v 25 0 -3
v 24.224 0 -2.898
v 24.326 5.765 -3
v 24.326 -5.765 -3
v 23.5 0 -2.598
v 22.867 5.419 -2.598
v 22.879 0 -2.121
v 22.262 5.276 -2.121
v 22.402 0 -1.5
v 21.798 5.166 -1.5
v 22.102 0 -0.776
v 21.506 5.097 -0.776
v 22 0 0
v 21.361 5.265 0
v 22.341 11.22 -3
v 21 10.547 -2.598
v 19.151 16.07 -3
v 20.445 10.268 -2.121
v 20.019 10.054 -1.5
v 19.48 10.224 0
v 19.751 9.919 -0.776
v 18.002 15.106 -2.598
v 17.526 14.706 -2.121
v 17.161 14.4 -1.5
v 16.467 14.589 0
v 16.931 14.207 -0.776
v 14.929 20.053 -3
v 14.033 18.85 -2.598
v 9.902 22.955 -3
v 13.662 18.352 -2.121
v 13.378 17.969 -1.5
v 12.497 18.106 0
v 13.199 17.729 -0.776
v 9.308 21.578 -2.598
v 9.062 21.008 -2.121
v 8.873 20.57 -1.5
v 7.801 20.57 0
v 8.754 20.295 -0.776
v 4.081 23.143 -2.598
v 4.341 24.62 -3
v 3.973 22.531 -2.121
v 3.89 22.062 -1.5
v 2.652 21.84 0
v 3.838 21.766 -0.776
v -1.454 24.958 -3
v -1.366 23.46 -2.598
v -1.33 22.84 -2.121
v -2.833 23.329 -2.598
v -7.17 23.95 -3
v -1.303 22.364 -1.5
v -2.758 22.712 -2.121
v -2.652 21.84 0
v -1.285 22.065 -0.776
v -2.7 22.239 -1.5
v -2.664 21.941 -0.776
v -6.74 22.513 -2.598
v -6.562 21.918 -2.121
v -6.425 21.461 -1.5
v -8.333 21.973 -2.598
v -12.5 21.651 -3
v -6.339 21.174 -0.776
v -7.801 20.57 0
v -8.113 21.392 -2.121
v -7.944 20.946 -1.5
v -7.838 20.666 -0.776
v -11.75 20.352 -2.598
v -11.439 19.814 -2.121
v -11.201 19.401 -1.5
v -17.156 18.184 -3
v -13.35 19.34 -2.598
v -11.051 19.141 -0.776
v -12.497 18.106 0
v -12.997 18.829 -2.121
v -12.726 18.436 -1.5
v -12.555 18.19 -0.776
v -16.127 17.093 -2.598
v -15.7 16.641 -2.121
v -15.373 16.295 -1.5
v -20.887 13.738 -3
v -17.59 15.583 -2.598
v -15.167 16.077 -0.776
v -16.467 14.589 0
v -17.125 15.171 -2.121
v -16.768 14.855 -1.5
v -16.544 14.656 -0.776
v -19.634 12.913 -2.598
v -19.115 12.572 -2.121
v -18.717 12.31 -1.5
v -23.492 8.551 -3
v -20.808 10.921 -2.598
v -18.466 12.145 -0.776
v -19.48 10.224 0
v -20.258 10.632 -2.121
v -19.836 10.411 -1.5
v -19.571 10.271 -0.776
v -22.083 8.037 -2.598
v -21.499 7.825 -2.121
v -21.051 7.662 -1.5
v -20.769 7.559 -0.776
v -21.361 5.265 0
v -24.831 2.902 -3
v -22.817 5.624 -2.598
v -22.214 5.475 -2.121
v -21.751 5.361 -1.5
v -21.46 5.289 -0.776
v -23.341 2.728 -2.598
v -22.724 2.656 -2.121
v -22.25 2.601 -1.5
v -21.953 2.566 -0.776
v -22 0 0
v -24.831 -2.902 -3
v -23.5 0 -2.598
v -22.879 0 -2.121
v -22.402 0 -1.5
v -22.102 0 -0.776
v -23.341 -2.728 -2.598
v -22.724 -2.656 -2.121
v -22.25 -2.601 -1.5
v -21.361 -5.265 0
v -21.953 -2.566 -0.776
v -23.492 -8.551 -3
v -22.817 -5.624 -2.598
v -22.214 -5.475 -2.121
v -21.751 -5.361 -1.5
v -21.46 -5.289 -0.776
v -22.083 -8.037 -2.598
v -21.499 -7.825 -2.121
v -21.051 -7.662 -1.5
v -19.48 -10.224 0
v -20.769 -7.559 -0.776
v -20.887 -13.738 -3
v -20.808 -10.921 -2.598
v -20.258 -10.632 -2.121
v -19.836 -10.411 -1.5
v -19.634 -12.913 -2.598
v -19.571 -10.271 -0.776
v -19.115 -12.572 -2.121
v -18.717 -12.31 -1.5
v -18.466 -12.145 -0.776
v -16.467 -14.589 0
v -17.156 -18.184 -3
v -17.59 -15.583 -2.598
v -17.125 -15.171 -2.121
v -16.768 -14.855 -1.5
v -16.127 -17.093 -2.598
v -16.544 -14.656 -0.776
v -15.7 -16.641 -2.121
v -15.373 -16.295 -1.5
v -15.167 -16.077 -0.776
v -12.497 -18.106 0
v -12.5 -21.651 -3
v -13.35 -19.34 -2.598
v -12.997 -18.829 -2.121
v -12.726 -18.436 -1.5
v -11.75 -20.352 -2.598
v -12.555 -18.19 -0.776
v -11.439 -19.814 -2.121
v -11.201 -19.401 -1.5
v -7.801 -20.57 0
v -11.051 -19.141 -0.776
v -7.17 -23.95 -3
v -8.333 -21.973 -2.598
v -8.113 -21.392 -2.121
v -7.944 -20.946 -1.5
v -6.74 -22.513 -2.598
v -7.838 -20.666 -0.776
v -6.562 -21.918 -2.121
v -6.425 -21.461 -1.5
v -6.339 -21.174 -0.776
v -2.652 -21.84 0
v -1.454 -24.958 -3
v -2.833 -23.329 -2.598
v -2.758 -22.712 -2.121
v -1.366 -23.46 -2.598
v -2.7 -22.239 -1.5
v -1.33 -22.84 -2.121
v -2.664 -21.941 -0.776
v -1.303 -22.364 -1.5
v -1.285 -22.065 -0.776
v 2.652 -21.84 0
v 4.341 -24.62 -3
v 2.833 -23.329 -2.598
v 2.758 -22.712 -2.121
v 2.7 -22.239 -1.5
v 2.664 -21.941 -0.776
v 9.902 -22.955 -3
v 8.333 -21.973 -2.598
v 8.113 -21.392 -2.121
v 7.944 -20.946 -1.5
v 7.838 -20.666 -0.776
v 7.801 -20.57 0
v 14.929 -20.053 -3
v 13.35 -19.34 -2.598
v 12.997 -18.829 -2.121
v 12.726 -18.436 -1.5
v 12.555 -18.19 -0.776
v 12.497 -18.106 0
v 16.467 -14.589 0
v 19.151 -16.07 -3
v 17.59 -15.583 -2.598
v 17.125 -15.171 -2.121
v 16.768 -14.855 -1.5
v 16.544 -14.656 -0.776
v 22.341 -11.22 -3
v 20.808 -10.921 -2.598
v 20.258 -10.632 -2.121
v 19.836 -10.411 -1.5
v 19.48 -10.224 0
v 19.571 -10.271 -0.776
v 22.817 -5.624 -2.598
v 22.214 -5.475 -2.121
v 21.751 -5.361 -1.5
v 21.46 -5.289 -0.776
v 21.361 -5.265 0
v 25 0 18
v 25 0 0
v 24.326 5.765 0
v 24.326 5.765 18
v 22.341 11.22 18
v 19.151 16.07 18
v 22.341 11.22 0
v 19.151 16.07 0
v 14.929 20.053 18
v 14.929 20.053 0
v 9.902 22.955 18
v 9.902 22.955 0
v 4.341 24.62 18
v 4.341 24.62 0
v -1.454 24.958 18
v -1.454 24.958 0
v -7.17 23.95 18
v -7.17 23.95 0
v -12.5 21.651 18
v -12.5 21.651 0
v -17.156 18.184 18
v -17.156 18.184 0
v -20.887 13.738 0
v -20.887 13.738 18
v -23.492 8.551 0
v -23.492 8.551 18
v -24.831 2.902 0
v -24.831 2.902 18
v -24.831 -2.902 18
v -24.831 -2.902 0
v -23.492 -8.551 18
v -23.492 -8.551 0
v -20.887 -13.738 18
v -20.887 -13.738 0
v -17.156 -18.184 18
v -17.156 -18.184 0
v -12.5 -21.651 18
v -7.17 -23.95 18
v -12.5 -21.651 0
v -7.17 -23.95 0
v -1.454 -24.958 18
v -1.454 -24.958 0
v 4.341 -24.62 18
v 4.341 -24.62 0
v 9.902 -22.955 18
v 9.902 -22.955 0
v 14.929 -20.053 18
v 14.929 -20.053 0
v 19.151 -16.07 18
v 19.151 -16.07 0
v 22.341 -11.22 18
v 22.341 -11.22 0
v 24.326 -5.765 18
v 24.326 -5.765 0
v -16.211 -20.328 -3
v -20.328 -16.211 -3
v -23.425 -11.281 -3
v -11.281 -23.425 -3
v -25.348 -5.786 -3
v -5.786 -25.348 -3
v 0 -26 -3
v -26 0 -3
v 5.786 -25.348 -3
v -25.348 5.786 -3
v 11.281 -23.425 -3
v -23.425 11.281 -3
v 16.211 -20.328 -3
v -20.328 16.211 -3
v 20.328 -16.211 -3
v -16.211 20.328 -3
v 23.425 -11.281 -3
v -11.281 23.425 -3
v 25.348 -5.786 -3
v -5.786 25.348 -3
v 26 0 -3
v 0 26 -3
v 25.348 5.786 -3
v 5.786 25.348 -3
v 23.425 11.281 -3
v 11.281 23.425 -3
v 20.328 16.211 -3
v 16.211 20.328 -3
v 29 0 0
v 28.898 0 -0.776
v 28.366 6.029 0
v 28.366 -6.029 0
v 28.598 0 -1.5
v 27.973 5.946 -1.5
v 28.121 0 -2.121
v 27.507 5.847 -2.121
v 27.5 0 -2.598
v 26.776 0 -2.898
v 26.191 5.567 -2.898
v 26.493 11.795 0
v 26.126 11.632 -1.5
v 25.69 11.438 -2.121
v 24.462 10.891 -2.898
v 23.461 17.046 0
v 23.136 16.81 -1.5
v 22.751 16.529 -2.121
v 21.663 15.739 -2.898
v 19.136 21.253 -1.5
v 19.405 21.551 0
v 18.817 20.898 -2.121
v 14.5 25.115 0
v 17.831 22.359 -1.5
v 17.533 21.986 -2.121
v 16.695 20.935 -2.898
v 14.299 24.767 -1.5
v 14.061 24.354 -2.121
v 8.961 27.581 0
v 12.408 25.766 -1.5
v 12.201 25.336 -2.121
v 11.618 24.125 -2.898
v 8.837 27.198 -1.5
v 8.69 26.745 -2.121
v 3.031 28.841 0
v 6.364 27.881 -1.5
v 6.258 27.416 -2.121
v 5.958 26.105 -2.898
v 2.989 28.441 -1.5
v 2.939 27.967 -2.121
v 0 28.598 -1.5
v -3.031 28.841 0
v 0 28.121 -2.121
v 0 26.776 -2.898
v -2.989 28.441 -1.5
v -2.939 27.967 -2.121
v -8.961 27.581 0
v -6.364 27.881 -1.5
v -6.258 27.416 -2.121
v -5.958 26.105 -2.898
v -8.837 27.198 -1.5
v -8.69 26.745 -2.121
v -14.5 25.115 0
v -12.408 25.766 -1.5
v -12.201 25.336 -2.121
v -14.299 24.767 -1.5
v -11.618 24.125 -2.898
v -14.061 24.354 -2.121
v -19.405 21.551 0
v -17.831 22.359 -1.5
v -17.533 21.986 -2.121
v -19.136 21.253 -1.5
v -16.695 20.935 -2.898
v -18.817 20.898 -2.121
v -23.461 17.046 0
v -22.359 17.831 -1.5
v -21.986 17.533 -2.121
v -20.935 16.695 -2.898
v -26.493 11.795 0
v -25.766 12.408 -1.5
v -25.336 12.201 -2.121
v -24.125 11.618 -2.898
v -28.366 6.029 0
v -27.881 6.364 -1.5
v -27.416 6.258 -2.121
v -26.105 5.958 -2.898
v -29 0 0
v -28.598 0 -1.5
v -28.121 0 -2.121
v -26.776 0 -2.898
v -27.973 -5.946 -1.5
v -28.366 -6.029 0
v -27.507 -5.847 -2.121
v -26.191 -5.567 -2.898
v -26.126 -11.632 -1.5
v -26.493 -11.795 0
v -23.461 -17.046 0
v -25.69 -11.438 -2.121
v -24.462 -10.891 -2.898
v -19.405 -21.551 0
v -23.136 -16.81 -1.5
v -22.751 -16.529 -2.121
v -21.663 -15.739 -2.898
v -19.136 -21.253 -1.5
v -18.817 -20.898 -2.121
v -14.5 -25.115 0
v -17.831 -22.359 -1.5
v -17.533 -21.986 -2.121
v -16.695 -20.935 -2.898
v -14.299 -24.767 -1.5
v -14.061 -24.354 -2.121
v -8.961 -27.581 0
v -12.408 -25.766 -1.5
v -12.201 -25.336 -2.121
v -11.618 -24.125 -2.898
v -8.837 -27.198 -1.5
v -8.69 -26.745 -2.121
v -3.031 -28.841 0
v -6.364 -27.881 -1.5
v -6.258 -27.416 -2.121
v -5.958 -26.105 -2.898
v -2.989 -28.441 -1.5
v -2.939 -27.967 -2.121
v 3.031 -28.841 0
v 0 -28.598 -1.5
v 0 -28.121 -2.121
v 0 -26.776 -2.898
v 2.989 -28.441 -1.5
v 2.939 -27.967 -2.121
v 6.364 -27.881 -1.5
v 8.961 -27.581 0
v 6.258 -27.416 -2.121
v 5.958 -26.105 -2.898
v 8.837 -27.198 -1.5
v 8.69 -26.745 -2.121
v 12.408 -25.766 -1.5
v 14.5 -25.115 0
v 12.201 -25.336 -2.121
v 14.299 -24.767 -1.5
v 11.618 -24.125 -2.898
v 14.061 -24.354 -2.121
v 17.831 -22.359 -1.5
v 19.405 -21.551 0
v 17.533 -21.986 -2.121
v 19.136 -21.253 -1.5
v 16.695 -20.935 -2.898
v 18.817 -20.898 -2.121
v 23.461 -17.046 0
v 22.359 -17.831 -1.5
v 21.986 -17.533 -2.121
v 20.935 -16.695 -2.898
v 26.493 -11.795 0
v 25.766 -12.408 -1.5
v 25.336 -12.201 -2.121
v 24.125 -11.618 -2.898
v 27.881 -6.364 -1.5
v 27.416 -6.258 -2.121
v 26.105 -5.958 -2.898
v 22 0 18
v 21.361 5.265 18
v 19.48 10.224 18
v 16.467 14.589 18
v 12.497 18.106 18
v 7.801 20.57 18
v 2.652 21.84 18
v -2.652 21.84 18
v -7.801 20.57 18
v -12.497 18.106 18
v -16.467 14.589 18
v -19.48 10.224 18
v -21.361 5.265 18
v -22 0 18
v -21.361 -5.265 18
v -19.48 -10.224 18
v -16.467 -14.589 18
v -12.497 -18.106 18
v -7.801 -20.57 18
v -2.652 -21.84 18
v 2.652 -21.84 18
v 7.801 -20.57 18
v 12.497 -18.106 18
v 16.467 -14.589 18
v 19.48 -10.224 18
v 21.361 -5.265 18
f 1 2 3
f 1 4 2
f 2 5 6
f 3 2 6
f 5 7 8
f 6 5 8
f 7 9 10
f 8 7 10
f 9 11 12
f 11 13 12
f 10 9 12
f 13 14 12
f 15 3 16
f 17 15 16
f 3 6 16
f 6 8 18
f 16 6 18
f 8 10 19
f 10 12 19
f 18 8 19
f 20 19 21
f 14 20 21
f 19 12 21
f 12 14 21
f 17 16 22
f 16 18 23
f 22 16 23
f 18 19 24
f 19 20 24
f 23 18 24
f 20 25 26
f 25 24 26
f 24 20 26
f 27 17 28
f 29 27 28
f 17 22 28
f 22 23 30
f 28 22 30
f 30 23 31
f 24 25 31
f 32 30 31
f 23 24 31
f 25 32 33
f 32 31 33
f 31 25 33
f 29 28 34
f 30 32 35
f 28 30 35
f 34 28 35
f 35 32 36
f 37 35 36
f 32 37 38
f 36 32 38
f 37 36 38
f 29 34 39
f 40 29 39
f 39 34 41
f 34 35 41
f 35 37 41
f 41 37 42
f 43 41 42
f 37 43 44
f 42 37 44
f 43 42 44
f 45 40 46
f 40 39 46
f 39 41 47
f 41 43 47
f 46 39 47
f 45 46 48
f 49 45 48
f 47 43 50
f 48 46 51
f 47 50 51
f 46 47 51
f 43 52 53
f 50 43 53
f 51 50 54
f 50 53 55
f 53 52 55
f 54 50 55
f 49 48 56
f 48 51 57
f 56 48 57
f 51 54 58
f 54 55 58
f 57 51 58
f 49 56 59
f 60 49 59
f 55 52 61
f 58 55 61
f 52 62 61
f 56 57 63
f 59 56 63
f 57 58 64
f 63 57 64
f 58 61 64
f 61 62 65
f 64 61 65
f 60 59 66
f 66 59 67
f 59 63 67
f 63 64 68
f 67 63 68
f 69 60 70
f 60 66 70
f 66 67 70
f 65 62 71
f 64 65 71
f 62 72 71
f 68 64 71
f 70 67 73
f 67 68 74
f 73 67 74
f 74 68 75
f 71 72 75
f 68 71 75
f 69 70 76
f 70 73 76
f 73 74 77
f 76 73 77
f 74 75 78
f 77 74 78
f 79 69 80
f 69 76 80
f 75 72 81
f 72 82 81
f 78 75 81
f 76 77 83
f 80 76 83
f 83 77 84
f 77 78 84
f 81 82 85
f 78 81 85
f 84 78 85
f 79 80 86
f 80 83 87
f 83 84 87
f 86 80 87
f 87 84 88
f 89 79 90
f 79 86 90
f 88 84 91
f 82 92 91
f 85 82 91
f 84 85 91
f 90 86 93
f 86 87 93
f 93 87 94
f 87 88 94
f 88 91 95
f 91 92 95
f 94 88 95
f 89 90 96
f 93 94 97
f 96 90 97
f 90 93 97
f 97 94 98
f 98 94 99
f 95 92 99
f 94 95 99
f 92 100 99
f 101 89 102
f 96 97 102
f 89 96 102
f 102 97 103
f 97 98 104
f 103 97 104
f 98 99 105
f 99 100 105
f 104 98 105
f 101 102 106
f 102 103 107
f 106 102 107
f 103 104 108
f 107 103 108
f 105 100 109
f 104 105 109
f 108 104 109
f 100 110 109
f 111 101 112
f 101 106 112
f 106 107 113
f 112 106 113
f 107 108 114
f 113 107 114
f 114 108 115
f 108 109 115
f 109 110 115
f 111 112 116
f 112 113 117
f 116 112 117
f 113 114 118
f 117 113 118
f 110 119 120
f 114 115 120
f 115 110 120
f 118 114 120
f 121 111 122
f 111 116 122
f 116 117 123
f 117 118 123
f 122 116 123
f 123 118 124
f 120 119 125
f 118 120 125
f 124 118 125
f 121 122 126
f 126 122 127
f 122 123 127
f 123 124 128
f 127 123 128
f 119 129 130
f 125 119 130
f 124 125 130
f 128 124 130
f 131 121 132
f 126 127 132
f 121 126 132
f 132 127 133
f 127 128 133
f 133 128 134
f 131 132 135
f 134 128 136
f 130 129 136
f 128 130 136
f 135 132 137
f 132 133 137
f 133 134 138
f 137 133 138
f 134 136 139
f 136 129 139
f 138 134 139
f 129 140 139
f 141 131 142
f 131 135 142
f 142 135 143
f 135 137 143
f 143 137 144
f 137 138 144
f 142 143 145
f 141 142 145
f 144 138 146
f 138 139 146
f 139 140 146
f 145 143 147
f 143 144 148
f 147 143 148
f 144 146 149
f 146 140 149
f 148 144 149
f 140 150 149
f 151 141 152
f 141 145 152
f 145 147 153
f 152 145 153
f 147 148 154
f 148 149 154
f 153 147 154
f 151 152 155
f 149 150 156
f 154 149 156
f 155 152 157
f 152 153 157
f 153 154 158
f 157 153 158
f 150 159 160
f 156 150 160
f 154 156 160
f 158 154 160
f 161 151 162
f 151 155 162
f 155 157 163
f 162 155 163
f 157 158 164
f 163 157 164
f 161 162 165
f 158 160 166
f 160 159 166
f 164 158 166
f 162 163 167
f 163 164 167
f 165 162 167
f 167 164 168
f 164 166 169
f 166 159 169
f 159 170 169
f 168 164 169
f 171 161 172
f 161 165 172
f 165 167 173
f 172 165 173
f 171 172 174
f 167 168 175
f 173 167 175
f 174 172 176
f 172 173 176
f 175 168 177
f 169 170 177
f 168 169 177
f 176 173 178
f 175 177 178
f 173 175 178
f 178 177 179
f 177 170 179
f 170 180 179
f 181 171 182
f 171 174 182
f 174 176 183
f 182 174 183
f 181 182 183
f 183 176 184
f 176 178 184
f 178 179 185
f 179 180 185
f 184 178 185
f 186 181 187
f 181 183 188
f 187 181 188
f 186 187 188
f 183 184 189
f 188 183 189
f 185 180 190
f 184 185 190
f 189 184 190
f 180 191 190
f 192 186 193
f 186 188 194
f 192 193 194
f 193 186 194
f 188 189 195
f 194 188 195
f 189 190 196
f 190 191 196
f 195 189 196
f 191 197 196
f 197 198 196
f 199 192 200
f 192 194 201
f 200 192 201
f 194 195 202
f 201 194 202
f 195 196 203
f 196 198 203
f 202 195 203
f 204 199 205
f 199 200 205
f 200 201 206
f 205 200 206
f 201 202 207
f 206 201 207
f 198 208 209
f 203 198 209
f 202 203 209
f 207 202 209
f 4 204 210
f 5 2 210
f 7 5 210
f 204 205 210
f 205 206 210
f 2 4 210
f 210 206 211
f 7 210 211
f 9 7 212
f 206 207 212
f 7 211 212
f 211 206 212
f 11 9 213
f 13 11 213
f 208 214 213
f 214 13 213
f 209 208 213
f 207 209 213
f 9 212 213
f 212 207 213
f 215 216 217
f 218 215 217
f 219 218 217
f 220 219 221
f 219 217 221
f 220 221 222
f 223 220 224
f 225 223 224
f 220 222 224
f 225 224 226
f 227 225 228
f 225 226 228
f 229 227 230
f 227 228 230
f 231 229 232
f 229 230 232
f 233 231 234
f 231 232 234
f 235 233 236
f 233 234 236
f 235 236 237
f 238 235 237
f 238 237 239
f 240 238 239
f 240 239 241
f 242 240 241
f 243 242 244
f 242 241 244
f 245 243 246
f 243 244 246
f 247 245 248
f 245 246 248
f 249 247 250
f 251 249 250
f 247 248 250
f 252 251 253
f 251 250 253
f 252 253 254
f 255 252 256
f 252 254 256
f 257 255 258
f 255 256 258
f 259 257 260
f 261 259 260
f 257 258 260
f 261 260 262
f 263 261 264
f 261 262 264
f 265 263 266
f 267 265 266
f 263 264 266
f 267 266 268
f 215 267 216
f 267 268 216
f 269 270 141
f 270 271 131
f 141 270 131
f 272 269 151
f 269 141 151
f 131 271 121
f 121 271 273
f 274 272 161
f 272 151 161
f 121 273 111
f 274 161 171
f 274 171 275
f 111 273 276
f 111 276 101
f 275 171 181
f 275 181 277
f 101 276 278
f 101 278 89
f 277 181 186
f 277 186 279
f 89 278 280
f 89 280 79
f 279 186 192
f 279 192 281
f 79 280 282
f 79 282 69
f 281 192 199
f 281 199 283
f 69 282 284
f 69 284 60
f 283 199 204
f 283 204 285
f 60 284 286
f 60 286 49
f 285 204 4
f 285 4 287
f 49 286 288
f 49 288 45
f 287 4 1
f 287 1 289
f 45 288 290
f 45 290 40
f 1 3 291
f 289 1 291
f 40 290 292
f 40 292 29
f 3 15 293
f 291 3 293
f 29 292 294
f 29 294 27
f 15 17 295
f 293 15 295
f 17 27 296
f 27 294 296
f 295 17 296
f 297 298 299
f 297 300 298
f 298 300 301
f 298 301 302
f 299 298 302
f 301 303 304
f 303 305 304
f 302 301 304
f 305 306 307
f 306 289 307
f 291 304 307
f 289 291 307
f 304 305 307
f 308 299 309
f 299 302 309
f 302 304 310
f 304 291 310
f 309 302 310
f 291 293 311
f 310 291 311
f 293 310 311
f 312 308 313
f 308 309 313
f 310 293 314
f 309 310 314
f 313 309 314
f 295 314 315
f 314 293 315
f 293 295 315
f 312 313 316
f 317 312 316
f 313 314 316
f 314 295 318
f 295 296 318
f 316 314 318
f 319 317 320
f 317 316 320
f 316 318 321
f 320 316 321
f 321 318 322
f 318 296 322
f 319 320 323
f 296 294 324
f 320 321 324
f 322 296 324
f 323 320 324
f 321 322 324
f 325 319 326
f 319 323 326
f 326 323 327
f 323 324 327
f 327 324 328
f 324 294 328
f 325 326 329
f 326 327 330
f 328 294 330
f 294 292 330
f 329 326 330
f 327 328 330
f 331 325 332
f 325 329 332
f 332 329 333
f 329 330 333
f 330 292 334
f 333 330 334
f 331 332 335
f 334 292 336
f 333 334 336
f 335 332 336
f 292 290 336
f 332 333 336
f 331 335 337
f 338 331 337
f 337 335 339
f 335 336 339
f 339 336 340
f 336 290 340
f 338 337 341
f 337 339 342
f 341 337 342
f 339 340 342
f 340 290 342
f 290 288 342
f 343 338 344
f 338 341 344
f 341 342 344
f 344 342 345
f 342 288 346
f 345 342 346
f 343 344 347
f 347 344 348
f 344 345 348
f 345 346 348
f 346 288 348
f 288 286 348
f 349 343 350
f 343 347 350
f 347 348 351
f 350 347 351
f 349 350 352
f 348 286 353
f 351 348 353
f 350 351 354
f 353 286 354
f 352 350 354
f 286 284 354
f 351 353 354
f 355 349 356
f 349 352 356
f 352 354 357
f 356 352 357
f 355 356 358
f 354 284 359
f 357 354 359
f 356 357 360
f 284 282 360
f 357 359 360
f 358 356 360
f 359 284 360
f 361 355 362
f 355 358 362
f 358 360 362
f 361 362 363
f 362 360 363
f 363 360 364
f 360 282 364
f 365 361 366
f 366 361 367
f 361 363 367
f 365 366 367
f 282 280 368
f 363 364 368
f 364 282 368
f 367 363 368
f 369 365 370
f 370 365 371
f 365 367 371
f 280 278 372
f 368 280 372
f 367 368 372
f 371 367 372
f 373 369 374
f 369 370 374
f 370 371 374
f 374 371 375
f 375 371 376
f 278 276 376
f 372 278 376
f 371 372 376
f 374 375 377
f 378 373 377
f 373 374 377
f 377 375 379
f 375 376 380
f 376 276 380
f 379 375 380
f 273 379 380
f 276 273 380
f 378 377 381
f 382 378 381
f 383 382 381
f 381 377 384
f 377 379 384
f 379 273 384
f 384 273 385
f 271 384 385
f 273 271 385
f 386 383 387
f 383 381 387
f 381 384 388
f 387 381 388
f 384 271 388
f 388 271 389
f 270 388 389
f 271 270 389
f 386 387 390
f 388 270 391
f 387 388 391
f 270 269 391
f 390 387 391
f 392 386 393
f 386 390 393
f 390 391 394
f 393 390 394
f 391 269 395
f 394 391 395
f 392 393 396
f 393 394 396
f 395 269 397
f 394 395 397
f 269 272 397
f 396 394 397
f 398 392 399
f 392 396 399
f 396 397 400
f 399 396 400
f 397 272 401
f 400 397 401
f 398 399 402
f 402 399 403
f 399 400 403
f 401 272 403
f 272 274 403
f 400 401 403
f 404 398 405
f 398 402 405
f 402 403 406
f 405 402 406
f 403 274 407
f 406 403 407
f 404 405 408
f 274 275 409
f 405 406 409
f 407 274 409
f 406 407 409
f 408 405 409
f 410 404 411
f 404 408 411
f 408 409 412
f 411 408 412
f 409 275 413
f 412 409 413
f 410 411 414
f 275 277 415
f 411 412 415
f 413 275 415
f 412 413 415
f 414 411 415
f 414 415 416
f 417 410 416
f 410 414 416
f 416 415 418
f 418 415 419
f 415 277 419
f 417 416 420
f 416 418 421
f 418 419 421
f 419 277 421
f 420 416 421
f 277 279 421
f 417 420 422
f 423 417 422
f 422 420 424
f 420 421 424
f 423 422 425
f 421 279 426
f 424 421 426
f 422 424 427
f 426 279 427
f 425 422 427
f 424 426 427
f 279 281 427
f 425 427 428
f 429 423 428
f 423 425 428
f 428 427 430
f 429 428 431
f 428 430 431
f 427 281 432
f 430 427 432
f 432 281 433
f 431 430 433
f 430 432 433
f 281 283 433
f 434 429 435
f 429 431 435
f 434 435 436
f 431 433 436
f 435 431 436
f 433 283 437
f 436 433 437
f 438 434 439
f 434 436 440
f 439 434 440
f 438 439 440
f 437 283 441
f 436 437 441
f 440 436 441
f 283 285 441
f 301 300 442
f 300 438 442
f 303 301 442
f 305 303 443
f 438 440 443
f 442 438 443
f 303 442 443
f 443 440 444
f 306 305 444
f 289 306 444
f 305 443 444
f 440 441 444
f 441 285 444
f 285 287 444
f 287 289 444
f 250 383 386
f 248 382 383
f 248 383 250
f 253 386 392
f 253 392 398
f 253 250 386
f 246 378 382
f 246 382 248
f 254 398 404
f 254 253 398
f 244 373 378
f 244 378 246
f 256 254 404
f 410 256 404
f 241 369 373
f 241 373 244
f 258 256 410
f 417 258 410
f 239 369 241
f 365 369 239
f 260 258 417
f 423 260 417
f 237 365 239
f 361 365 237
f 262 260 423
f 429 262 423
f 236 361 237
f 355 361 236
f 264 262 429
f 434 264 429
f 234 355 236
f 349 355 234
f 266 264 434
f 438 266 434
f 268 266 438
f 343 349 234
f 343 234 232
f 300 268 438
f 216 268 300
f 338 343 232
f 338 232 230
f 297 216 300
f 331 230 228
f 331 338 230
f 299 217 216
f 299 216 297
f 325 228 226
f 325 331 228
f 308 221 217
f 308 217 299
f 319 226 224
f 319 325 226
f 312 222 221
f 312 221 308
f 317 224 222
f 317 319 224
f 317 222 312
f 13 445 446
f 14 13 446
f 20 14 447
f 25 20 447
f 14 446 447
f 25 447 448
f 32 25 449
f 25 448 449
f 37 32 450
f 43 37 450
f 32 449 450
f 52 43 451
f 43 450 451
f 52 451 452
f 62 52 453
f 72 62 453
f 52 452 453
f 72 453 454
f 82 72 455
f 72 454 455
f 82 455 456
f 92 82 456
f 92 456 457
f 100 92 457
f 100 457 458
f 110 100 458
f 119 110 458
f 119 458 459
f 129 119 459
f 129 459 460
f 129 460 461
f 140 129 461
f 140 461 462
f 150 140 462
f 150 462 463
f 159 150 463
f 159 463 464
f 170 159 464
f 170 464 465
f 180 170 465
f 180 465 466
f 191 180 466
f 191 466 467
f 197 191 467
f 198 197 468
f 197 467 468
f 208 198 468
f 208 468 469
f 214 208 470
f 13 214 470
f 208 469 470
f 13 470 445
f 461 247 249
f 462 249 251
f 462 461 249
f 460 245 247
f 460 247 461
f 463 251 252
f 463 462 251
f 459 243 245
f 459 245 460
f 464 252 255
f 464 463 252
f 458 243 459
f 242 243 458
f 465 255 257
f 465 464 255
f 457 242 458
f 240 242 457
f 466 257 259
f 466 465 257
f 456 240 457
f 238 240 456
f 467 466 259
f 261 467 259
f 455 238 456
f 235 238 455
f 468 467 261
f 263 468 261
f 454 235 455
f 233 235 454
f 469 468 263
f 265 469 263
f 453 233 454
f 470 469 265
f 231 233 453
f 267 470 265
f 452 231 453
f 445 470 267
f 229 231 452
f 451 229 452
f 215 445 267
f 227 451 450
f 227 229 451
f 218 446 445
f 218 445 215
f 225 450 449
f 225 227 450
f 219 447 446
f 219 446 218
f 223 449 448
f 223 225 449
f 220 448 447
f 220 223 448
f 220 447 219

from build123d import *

# Parameters (mm, degrees)
F0_R     = 25
F1_DEPTH = 18
F2_R     = 29
F3_DEPTH = 3
F4_R     = 22
F5_DEPTH = 21.001
F6_R     = 2.99999


# Not quite as in the source:
# - a fillet or chamfer is up to 0.001 mm smaller than in the source, because OpenCascade refuses the exact size


with BuildPart() as f1:
    # F0 (on Top) → F1 (new body)
    with BuildSketch(Plane.XY):
        Circle(F0_R)
    extrude(amount=F1_DEPTH)

    # F2 (on Top) → F3 (join)
    with BuildSketch(Plane.XY):
        Circle(F2_R)
    extrude(amount=-F3_DEPTH)

    # F4 (on face) → F5 (cut, through all)
    with BuildSketch(Plane.XY.offset(18)):
        Circle(F4_R)
    extrude(amount=-F5_DEPTH, mode=Mode.SUBTRACT)

    # F6 (radius 3 in the source; OpenCascade refuses exactly that, so slightly less here)
    f6_edges = [f1.edges().sort_by_distance(p)[0] for p in [
        (-22, 0, -3),
        (-29, 0, -3),
    ]]
    fillet(f6_edges, radius=F6_R)


solid = f1.part
